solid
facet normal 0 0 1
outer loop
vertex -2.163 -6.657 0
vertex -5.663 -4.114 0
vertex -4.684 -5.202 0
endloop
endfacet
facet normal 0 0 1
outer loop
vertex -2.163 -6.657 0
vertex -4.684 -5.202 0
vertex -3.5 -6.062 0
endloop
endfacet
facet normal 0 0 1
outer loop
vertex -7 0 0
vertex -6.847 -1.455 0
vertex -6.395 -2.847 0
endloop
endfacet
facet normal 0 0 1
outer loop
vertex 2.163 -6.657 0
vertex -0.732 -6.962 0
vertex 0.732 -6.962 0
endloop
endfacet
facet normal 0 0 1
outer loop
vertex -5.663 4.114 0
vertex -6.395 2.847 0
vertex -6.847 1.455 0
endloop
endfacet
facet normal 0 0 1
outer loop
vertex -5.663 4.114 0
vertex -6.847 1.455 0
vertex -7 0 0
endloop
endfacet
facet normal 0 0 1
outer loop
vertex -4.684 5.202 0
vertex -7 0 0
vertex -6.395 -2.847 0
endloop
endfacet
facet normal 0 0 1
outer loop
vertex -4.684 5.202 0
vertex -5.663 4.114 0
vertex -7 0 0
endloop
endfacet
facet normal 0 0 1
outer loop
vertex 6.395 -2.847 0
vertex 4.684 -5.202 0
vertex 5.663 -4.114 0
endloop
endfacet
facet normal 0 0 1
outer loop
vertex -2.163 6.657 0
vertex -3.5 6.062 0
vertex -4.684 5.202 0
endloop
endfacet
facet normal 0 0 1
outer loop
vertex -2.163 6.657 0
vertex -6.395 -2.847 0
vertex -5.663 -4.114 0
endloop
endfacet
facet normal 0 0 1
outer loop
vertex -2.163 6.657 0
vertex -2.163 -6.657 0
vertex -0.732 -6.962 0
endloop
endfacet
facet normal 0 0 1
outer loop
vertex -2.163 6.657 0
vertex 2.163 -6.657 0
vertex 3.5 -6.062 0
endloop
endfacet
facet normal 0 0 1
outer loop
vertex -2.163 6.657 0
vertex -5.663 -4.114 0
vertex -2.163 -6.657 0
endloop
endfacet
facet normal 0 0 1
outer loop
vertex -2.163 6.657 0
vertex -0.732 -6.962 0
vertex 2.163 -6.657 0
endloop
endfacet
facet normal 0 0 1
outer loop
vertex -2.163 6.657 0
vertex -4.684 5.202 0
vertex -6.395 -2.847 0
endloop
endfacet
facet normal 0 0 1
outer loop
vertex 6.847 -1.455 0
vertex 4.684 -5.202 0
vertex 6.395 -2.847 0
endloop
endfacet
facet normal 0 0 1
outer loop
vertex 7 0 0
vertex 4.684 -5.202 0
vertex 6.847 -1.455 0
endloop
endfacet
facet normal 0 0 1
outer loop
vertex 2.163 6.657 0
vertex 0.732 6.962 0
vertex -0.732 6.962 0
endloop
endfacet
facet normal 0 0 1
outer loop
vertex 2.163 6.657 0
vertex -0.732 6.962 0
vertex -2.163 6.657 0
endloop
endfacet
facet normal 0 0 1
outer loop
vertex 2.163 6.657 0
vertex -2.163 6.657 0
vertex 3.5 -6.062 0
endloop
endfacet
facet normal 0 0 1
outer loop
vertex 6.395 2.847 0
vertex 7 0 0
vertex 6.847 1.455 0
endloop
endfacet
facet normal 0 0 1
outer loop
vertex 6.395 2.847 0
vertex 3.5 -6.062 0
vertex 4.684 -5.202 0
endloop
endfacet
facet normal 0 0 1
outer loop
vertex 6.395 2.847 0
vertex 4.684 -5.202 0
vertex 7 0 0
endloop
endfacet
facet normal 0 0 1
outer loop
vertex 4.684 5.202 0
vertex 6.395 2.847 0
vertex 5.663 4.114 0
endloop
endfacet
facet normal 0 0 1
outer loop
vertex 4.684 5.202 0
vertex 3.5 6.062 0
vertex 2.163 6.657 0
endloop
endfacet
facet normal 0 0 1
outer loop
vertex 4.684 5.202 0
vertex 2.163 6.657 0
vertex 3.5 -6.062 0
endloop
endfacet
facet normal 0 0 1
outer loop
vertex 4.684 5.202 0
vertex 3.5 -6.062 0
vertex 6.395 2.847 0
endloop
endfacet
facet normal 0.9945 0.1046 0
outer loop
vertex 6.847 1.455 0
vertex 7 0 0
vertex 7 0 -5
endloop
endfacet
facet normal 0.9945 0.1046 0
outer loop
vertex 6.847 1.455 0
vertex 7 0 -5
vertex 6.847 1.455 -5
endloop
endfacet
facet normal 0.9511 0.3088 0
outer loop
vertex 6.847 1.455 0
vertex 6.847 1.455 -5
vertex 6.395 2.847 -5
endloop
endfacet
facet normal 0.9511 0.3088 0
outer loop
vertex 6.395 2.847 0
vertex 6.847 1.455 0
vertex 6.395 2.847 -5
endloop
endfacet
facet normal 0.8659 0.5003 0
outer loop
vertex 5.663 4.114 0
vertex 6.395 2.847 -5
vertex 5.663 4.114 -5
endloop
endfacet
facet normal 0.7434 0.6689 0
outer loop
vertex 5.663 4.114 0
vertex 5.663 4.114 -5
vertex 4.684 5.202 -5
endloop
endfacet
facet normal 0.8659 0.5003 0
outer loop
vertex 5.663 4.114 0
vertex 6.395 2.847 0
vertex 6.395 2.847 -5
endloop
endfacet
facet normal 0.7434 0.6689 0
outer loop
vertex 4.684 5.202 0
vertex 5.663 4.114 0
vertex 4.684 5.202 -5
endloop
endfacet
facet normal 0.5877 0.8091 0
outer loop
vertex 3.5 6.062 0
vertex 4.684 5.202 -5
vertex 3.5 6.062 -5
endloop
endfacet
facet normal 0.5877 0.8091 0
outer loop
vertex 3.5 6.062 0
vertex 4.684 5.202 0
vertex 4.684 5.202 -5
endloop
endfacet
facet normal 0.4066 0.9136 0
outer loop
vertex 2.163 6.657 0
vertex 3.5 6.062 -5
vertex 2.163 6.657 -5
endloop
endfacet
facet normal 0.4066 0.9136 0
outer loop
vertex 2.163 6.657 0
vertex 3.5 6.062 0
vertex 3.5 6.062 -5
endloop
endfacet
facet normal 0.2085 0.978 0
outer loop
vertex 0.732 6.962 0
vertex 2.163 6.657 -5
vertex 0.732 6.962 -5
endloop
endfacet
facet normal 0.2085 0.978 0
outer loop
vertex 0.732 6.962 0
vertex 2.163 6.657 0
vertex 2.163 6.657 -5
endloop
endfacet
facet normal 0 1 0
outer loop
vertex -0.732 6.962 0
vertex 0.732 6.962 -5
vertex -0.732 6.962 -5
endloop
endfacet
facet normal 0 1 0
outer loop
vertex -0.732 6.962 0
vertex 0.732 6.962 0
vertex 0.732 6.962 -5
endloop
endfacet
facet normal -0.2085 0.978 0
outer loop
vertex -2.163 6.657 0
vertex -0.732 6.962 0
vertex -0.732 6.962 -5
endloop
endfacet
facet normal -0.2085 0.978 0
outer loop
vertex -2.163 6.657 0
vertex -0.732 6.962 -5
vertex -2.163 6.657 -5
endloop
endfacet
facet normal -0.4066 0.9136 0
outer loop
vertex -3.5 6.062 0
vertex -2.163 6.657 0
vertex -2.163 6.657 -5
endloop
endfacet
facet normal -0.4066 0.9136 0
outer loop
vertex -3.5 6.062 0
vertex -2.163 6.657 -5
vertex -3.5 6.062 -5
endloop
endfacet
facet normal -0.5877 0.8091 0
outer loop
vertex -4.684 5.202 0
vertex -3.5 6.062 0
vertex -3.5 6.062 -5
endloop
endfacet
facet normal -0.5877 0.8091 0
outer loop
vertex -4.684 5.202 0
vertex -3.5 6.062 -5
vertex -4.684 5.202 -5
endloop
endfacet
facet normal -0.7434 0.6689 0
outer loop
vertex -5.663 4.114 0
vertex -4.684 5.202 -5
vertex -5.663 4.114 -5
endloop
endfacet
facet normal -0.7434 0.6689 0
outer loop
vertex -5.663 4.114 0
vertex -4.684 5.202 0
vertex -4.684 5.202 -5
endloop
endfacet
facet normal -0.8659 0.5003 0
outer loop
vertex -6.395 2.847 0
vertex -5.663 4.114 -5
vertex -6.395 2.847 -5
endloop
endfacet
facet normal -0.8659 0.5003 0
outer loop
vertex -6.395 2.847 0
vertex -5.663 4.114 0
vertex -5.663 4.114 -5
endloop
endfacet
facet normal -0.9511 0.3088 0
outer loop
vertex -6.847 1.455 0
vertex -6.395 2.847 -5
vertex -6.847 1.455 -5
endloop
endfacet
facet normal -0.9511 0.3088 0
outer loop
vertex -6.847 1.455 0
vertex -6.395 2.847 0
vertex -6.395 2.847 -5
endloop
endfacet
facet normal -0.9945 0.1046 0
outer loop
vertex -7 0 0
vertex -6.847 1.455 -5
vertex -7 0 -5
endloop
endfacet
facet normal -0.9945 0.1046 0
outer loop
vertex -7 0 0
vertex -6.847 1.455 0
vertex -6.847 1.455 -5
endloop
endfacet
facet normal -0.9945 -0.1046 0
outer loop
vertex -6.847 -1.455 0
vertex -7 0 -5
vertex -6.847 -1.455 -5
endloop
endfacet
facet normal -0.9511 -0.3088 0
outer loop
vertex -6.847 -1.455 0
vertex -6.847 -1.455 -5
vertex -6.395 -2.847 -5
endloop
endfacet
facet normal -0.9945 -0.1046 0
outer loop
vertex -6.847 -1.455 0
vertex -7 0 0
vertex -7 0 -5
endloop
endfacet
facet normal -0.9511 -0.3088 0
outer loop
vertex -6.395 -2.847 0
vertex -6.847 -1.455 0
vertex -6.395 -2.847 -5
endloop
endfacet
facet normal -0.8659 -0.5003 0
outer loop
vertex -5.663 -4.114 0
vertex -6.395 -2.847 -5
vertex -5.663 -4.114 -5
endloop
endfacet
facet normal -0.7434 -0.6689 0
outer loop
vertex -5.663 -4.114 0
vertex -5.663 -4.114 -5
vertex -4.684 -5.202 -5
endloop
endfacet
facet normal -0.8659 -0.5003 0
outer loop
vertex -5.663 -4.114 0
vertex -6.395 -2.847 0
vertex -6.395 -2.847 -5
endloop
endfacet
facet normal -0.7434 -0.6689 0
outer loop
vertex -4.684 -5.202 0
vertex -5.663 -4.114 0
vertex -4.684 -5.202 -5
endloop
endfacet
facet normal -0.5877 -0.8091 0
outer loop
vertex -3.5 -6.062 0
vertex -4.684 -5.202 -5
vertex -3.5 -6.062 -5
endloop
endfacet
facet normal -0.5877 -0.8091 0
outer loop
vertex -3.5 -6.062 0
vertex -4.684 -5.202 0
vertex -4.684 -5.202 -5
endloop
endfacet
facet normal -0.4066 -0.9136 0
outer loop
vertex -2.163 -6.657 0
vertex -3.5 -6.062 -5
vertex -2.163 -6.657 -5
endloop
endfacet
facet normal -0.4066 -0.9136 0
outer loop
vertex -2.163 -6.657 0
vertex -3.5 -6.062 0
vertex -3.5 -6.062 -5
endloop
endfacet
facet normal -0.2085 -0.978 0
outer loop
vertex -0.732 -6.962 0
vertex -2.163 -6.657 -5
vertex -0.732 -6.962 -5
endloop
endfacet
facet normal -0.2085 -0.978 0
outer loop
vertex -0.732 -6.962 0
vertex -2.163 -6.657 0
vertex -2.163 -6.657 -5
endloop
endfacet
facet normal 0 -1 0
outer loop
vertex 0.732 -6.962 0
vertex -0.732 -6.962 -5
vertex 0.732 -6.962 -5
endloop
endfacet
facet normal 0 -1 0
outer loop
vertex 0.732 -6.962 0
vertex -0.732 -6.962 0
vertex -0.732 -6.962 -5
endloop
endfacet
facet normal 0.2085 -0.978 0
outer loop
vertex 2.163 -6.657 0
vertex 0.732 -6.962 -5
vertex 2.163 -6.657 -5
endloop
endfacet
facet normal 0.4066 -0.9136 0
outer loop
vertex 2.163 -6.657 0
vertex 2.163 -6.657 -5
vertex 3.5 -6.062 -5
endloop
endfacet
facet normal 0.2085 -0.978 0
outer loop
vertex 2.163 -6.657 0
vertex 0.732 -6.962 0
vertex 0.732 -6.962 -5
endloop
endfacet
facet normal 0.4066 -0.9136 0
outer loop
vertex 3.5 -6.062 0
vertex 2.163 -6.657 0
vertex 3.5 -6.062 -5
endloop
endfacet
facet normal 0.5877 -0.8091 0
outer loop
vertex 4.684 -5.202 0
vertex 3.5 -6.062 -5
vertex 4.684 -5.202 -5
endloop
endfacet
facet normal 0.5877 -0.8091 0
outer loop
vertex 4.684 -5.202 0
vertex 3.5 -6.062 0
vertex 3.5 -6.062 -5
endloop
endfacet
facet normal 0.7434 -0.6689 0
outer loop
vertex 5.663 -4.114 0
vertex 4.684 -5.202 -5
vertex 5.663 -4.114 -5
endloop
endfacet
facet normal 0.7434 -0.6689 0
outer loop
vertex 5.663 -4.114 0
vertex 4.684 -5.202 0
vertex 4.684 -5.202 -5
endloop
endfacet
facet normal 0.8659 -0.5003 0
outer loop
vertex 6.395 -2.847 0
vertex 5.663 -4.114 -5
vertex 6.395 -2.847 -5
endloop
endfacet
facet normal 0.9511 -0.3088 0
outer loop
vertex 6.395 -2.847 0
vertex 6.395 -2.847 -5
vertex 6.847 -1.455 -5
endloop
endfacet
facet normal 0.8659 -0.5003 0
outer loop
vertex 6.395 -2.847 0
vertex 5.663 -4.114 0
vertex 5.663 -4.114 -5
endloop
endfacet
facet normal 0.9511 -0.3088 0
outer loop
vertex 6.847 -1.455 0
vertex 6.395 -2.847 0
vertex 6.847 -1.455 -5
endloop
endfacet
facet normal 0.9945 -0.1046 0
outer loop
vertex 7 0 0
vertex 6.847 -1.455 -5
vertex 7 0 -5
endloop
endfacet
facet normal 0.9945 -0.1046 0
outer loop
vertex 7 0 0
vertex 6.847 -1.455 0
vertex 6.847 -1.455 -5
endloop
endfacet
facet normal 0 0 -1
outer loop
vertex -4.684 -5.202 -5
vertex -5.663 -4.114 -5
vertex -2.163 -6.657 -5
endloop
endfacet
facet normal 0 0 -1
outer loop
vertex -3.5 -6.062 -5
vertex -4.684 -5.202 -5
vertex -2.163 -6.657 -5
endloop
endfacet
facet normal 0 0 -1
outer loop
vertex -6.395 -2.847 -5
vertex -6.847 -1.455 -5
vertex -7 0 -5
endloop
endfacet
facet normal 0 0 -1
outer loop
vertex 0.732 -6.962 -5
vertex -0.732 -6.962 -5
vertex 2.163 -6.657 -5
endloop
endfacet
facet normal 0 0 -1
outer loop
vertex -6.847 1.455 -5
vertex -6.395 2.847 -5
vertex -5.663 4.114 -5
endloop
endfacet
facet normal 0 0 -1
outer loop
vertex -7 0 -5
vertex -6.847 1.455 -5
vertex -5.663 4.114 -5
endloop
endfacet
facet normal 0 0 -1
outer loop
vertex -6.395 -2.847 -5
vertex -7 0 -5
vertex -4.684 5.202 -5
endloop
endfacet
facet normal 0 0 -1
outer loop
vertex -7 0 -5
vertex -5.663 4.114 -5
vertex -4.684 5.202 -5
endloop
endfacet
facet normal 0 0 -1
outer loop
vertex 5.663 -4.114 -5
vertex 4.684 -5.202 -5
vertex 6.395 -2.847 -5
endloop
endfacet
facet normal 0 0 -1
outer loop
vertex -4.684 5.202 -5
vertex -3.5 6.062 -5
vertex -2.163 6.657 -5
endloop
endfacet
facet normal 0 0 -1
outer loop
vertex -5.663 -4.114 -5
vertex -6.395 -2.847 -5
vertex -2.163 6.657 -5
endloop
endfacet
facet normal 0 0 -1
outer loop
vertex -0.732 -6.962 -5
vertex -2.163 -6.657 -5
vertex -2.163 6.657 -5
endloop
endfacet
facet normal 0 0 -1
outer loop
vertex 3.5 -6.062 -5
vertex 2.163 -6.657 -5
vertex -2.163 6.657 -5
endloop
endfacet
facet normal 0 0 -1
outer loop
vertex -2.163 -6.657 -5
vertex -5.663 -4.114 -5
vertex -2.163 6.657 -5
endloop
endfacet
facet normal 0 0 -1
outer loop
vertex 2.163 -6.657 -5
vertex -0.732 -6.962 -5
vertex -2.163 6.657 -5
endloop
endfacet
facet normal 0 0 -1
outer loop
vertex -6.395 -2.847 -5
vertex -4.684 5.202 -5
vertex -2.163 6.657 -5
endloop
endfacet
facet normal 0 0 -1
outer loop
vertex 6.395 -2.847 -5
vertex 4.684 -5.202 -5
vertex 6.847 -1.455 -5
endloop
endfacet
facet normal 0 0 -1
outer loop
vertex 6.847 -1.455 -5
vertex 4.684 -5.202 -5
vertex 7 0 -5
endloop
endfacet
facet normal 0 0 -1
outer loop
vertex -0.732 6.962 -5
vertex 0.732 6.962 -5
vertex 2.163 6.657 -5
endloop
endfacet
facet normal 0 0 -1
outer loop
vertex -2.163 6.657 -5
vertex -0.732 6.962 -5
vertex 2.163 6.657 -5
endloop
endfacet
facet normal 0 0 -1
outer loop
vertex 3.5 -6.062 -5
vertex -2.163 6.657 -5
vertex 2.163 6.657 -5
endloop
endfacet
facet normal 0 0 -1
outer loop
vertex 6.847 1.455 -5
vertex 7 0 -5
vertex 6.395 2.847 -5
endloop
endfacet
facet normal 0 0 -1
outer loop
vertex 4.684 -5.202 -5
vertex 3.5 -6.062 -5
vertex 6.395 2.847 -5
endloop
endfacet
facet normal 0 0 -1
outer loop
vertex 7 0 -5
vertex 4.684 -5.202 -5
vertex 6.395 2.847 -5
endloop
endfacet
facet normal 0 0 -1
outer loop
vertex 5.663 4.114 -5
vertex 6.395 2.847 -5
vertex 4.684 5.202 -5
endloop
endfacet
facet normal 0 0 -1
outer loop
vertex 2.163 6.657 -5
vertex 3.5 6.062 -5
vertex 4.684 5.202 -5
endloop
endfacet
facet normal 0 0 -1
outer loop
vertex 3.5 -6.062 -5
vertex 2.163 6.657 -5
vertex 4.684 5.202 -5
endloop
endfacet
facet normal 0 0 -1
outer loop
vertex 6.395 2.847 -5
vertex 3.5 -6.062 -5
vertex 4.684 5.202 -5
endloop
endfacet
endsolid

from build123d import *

# Parameters (mm, degrees)
F0_R      = 7
F1_DEPTH  = 5
F2_R      = 7
F3_DEPTH  = 5
F1_FACE_R = 7
F4_DEPTH  = 5


with BuildPart() as f1:
    # F0 (on Top) → F1 (new body)
    with BuildSketch(Plane.XY):
        Circle(F0_R)
    extrude(amount=F1_DEPTH)

    # F2 (on Top) → F3 (join)
    with BuildSketch(Plane.XY):
        Circle(F2_R)
    extrude(amount=-F3_DEPTH)

    # F1_face (on face) → F4 (cut)
    with BuildSketch(Plane.XY.offset(5)):
        Circle(F1_FACE_R)
    extrude(amount=-F4_DEPTH, mode=Mode.SUBTRACT)


solid = f1.part
